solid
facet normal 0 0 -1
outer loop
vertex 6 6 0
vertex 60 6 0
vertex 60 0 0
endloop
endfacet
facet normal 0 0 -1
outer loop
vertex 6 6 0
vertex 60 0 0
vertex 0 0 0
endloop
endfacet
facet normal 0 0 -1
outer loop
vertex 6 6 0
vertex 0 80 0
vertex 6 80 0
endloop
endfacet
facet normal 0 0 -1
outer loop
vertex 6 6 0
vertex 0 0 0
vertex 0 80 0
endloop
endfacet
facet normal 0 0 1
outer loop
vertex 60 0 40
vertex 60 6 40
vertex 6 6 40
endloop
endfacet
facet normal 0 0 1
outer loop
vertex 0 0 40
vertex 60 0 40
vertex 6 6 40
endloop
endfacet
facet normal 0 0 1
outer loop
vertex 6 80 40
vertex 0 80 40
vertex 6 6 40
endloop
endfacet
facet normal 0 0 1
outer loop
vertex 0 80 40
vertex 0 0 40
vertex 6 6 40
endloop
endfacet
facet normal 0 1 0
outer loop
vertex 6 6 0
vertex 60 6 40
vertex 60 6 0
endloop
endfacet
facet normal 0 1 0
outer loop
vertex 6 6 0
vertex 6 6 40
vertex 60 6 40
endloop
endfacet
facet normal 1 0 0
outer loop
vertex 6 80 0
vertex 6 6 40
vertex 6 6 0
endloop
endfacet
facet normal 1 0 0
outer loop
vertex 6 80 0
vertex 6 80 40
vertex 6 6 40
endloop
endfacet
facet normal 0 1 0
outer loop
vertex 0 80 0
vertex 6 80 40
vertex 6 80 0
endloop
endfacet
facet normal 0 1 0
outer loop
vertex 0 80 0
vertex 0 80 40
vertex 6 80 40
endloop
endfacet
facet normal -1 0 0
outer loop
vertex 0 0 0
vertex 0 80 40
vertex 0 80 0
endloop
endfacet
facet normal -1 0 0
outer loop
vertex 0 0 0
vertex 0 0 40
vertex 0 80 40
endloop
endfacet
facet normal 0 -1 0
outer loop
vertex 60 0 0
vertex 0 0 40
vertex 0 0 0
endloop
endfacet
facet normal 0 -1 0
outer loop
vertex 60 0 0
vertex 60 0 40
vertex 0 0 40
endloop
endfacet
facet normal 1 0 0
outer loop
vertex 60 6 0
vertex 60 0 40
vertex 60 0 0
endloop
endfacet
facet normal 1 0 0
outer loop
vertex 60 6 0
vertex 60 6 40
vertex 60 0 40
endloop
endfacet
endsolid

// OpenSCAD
$fn = 32;

// ----------------------------------------------------------------------
// Structural section: angle 60 x 80 mm
// ----------------------------------------------------------------------

// --- parameters (mm) ---
sec_w = 60;               // leg width, X
sec_h = 80;               // leg height, Y
flange_t = 6;             // leg thickness
plate_t = 40;             // cut length, Z (extrusion height)

profile = [[0, 0], [60, 0], [60, 6], [6, 6], [6, 80], [0, 80]];  // primary outline, 6 points, counter clockwise

// --- the one profile operation ---
linear_extrude(height = plate_t) polygon(points = profile);
